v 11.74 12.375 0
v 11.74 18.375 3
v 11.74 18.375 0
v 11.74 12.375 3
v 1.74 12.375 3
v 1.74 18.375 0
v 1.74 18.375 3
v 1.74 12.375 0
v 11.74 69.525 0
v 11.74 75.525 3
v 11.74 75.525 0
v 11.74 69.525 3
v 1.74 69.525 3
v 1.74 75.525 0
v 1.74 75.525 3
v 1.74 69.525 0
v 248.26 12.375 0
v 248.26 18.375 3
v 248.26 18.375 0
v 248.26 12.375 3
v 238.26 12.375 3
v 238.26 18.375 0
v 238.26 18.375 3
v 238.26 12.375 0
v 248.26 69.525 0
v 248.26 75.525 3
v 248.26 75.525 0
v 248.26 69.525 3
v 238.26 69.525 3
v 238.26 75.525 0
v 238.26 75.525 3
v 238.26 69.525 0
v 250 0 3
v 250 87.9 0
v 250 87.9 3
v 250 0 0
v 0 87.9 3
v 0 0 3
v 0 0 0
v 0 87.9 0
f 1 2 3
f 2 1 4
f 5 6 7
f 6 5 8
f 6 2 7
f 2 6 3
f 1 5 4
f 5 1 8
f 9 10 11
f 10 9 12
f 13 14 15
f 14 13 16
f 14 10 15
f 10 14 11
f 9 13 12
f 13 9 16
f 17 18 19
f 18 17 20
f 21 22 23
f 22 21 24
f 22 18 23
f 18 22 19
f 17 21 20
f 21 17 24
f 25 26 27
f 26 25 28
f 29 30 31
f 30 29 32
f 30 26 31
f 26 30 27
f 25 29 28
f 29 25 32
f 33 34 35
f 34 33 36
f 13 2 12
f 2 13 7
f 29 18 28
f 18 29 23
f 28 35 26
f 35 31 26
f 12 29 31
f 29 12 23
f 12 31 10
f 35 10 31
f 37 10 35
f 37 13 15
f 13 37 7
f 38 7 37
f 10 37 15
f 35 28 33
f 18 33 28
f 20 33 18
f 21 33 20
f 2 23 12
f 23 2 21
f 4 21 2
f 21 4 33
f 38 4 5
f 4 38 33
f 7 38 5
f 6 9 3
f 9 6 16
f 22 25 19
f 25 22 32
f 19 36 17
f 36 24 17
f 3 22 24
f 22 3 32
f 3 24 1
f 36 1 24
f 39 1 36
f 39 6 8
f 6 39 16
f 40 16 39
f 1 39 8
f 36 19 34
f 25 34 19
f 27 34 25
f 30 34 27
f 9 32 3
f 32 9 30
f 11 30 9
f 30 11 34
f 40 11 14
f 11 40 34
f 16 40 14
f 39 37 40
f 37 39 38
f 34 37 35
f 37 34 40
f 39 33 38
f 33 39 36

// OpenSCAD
// TL1_Plate_2U_Shifted_0p5U
// Homelab Rack CAD Standard v1.0 - millimeters
// Mount positions provisional: test-fit against DeskPi TL1 rail!
plate_width=250;
plate_height=87.9;
plate_thickness=3;
slot_width=10;
slot_height=6;
slot_x=[6.74,243.26];
slot_y=[15.375,72.525];
difference() {
  cube([plate_width,plate_height,plate_thickness]);
  for (x=slot_x) for (y=slot_y)
    translate([x-slot_width/2,y-slot_height/2,-0.5])
      cube([slot_width,slot_height,plate_thickness+1]);
}
